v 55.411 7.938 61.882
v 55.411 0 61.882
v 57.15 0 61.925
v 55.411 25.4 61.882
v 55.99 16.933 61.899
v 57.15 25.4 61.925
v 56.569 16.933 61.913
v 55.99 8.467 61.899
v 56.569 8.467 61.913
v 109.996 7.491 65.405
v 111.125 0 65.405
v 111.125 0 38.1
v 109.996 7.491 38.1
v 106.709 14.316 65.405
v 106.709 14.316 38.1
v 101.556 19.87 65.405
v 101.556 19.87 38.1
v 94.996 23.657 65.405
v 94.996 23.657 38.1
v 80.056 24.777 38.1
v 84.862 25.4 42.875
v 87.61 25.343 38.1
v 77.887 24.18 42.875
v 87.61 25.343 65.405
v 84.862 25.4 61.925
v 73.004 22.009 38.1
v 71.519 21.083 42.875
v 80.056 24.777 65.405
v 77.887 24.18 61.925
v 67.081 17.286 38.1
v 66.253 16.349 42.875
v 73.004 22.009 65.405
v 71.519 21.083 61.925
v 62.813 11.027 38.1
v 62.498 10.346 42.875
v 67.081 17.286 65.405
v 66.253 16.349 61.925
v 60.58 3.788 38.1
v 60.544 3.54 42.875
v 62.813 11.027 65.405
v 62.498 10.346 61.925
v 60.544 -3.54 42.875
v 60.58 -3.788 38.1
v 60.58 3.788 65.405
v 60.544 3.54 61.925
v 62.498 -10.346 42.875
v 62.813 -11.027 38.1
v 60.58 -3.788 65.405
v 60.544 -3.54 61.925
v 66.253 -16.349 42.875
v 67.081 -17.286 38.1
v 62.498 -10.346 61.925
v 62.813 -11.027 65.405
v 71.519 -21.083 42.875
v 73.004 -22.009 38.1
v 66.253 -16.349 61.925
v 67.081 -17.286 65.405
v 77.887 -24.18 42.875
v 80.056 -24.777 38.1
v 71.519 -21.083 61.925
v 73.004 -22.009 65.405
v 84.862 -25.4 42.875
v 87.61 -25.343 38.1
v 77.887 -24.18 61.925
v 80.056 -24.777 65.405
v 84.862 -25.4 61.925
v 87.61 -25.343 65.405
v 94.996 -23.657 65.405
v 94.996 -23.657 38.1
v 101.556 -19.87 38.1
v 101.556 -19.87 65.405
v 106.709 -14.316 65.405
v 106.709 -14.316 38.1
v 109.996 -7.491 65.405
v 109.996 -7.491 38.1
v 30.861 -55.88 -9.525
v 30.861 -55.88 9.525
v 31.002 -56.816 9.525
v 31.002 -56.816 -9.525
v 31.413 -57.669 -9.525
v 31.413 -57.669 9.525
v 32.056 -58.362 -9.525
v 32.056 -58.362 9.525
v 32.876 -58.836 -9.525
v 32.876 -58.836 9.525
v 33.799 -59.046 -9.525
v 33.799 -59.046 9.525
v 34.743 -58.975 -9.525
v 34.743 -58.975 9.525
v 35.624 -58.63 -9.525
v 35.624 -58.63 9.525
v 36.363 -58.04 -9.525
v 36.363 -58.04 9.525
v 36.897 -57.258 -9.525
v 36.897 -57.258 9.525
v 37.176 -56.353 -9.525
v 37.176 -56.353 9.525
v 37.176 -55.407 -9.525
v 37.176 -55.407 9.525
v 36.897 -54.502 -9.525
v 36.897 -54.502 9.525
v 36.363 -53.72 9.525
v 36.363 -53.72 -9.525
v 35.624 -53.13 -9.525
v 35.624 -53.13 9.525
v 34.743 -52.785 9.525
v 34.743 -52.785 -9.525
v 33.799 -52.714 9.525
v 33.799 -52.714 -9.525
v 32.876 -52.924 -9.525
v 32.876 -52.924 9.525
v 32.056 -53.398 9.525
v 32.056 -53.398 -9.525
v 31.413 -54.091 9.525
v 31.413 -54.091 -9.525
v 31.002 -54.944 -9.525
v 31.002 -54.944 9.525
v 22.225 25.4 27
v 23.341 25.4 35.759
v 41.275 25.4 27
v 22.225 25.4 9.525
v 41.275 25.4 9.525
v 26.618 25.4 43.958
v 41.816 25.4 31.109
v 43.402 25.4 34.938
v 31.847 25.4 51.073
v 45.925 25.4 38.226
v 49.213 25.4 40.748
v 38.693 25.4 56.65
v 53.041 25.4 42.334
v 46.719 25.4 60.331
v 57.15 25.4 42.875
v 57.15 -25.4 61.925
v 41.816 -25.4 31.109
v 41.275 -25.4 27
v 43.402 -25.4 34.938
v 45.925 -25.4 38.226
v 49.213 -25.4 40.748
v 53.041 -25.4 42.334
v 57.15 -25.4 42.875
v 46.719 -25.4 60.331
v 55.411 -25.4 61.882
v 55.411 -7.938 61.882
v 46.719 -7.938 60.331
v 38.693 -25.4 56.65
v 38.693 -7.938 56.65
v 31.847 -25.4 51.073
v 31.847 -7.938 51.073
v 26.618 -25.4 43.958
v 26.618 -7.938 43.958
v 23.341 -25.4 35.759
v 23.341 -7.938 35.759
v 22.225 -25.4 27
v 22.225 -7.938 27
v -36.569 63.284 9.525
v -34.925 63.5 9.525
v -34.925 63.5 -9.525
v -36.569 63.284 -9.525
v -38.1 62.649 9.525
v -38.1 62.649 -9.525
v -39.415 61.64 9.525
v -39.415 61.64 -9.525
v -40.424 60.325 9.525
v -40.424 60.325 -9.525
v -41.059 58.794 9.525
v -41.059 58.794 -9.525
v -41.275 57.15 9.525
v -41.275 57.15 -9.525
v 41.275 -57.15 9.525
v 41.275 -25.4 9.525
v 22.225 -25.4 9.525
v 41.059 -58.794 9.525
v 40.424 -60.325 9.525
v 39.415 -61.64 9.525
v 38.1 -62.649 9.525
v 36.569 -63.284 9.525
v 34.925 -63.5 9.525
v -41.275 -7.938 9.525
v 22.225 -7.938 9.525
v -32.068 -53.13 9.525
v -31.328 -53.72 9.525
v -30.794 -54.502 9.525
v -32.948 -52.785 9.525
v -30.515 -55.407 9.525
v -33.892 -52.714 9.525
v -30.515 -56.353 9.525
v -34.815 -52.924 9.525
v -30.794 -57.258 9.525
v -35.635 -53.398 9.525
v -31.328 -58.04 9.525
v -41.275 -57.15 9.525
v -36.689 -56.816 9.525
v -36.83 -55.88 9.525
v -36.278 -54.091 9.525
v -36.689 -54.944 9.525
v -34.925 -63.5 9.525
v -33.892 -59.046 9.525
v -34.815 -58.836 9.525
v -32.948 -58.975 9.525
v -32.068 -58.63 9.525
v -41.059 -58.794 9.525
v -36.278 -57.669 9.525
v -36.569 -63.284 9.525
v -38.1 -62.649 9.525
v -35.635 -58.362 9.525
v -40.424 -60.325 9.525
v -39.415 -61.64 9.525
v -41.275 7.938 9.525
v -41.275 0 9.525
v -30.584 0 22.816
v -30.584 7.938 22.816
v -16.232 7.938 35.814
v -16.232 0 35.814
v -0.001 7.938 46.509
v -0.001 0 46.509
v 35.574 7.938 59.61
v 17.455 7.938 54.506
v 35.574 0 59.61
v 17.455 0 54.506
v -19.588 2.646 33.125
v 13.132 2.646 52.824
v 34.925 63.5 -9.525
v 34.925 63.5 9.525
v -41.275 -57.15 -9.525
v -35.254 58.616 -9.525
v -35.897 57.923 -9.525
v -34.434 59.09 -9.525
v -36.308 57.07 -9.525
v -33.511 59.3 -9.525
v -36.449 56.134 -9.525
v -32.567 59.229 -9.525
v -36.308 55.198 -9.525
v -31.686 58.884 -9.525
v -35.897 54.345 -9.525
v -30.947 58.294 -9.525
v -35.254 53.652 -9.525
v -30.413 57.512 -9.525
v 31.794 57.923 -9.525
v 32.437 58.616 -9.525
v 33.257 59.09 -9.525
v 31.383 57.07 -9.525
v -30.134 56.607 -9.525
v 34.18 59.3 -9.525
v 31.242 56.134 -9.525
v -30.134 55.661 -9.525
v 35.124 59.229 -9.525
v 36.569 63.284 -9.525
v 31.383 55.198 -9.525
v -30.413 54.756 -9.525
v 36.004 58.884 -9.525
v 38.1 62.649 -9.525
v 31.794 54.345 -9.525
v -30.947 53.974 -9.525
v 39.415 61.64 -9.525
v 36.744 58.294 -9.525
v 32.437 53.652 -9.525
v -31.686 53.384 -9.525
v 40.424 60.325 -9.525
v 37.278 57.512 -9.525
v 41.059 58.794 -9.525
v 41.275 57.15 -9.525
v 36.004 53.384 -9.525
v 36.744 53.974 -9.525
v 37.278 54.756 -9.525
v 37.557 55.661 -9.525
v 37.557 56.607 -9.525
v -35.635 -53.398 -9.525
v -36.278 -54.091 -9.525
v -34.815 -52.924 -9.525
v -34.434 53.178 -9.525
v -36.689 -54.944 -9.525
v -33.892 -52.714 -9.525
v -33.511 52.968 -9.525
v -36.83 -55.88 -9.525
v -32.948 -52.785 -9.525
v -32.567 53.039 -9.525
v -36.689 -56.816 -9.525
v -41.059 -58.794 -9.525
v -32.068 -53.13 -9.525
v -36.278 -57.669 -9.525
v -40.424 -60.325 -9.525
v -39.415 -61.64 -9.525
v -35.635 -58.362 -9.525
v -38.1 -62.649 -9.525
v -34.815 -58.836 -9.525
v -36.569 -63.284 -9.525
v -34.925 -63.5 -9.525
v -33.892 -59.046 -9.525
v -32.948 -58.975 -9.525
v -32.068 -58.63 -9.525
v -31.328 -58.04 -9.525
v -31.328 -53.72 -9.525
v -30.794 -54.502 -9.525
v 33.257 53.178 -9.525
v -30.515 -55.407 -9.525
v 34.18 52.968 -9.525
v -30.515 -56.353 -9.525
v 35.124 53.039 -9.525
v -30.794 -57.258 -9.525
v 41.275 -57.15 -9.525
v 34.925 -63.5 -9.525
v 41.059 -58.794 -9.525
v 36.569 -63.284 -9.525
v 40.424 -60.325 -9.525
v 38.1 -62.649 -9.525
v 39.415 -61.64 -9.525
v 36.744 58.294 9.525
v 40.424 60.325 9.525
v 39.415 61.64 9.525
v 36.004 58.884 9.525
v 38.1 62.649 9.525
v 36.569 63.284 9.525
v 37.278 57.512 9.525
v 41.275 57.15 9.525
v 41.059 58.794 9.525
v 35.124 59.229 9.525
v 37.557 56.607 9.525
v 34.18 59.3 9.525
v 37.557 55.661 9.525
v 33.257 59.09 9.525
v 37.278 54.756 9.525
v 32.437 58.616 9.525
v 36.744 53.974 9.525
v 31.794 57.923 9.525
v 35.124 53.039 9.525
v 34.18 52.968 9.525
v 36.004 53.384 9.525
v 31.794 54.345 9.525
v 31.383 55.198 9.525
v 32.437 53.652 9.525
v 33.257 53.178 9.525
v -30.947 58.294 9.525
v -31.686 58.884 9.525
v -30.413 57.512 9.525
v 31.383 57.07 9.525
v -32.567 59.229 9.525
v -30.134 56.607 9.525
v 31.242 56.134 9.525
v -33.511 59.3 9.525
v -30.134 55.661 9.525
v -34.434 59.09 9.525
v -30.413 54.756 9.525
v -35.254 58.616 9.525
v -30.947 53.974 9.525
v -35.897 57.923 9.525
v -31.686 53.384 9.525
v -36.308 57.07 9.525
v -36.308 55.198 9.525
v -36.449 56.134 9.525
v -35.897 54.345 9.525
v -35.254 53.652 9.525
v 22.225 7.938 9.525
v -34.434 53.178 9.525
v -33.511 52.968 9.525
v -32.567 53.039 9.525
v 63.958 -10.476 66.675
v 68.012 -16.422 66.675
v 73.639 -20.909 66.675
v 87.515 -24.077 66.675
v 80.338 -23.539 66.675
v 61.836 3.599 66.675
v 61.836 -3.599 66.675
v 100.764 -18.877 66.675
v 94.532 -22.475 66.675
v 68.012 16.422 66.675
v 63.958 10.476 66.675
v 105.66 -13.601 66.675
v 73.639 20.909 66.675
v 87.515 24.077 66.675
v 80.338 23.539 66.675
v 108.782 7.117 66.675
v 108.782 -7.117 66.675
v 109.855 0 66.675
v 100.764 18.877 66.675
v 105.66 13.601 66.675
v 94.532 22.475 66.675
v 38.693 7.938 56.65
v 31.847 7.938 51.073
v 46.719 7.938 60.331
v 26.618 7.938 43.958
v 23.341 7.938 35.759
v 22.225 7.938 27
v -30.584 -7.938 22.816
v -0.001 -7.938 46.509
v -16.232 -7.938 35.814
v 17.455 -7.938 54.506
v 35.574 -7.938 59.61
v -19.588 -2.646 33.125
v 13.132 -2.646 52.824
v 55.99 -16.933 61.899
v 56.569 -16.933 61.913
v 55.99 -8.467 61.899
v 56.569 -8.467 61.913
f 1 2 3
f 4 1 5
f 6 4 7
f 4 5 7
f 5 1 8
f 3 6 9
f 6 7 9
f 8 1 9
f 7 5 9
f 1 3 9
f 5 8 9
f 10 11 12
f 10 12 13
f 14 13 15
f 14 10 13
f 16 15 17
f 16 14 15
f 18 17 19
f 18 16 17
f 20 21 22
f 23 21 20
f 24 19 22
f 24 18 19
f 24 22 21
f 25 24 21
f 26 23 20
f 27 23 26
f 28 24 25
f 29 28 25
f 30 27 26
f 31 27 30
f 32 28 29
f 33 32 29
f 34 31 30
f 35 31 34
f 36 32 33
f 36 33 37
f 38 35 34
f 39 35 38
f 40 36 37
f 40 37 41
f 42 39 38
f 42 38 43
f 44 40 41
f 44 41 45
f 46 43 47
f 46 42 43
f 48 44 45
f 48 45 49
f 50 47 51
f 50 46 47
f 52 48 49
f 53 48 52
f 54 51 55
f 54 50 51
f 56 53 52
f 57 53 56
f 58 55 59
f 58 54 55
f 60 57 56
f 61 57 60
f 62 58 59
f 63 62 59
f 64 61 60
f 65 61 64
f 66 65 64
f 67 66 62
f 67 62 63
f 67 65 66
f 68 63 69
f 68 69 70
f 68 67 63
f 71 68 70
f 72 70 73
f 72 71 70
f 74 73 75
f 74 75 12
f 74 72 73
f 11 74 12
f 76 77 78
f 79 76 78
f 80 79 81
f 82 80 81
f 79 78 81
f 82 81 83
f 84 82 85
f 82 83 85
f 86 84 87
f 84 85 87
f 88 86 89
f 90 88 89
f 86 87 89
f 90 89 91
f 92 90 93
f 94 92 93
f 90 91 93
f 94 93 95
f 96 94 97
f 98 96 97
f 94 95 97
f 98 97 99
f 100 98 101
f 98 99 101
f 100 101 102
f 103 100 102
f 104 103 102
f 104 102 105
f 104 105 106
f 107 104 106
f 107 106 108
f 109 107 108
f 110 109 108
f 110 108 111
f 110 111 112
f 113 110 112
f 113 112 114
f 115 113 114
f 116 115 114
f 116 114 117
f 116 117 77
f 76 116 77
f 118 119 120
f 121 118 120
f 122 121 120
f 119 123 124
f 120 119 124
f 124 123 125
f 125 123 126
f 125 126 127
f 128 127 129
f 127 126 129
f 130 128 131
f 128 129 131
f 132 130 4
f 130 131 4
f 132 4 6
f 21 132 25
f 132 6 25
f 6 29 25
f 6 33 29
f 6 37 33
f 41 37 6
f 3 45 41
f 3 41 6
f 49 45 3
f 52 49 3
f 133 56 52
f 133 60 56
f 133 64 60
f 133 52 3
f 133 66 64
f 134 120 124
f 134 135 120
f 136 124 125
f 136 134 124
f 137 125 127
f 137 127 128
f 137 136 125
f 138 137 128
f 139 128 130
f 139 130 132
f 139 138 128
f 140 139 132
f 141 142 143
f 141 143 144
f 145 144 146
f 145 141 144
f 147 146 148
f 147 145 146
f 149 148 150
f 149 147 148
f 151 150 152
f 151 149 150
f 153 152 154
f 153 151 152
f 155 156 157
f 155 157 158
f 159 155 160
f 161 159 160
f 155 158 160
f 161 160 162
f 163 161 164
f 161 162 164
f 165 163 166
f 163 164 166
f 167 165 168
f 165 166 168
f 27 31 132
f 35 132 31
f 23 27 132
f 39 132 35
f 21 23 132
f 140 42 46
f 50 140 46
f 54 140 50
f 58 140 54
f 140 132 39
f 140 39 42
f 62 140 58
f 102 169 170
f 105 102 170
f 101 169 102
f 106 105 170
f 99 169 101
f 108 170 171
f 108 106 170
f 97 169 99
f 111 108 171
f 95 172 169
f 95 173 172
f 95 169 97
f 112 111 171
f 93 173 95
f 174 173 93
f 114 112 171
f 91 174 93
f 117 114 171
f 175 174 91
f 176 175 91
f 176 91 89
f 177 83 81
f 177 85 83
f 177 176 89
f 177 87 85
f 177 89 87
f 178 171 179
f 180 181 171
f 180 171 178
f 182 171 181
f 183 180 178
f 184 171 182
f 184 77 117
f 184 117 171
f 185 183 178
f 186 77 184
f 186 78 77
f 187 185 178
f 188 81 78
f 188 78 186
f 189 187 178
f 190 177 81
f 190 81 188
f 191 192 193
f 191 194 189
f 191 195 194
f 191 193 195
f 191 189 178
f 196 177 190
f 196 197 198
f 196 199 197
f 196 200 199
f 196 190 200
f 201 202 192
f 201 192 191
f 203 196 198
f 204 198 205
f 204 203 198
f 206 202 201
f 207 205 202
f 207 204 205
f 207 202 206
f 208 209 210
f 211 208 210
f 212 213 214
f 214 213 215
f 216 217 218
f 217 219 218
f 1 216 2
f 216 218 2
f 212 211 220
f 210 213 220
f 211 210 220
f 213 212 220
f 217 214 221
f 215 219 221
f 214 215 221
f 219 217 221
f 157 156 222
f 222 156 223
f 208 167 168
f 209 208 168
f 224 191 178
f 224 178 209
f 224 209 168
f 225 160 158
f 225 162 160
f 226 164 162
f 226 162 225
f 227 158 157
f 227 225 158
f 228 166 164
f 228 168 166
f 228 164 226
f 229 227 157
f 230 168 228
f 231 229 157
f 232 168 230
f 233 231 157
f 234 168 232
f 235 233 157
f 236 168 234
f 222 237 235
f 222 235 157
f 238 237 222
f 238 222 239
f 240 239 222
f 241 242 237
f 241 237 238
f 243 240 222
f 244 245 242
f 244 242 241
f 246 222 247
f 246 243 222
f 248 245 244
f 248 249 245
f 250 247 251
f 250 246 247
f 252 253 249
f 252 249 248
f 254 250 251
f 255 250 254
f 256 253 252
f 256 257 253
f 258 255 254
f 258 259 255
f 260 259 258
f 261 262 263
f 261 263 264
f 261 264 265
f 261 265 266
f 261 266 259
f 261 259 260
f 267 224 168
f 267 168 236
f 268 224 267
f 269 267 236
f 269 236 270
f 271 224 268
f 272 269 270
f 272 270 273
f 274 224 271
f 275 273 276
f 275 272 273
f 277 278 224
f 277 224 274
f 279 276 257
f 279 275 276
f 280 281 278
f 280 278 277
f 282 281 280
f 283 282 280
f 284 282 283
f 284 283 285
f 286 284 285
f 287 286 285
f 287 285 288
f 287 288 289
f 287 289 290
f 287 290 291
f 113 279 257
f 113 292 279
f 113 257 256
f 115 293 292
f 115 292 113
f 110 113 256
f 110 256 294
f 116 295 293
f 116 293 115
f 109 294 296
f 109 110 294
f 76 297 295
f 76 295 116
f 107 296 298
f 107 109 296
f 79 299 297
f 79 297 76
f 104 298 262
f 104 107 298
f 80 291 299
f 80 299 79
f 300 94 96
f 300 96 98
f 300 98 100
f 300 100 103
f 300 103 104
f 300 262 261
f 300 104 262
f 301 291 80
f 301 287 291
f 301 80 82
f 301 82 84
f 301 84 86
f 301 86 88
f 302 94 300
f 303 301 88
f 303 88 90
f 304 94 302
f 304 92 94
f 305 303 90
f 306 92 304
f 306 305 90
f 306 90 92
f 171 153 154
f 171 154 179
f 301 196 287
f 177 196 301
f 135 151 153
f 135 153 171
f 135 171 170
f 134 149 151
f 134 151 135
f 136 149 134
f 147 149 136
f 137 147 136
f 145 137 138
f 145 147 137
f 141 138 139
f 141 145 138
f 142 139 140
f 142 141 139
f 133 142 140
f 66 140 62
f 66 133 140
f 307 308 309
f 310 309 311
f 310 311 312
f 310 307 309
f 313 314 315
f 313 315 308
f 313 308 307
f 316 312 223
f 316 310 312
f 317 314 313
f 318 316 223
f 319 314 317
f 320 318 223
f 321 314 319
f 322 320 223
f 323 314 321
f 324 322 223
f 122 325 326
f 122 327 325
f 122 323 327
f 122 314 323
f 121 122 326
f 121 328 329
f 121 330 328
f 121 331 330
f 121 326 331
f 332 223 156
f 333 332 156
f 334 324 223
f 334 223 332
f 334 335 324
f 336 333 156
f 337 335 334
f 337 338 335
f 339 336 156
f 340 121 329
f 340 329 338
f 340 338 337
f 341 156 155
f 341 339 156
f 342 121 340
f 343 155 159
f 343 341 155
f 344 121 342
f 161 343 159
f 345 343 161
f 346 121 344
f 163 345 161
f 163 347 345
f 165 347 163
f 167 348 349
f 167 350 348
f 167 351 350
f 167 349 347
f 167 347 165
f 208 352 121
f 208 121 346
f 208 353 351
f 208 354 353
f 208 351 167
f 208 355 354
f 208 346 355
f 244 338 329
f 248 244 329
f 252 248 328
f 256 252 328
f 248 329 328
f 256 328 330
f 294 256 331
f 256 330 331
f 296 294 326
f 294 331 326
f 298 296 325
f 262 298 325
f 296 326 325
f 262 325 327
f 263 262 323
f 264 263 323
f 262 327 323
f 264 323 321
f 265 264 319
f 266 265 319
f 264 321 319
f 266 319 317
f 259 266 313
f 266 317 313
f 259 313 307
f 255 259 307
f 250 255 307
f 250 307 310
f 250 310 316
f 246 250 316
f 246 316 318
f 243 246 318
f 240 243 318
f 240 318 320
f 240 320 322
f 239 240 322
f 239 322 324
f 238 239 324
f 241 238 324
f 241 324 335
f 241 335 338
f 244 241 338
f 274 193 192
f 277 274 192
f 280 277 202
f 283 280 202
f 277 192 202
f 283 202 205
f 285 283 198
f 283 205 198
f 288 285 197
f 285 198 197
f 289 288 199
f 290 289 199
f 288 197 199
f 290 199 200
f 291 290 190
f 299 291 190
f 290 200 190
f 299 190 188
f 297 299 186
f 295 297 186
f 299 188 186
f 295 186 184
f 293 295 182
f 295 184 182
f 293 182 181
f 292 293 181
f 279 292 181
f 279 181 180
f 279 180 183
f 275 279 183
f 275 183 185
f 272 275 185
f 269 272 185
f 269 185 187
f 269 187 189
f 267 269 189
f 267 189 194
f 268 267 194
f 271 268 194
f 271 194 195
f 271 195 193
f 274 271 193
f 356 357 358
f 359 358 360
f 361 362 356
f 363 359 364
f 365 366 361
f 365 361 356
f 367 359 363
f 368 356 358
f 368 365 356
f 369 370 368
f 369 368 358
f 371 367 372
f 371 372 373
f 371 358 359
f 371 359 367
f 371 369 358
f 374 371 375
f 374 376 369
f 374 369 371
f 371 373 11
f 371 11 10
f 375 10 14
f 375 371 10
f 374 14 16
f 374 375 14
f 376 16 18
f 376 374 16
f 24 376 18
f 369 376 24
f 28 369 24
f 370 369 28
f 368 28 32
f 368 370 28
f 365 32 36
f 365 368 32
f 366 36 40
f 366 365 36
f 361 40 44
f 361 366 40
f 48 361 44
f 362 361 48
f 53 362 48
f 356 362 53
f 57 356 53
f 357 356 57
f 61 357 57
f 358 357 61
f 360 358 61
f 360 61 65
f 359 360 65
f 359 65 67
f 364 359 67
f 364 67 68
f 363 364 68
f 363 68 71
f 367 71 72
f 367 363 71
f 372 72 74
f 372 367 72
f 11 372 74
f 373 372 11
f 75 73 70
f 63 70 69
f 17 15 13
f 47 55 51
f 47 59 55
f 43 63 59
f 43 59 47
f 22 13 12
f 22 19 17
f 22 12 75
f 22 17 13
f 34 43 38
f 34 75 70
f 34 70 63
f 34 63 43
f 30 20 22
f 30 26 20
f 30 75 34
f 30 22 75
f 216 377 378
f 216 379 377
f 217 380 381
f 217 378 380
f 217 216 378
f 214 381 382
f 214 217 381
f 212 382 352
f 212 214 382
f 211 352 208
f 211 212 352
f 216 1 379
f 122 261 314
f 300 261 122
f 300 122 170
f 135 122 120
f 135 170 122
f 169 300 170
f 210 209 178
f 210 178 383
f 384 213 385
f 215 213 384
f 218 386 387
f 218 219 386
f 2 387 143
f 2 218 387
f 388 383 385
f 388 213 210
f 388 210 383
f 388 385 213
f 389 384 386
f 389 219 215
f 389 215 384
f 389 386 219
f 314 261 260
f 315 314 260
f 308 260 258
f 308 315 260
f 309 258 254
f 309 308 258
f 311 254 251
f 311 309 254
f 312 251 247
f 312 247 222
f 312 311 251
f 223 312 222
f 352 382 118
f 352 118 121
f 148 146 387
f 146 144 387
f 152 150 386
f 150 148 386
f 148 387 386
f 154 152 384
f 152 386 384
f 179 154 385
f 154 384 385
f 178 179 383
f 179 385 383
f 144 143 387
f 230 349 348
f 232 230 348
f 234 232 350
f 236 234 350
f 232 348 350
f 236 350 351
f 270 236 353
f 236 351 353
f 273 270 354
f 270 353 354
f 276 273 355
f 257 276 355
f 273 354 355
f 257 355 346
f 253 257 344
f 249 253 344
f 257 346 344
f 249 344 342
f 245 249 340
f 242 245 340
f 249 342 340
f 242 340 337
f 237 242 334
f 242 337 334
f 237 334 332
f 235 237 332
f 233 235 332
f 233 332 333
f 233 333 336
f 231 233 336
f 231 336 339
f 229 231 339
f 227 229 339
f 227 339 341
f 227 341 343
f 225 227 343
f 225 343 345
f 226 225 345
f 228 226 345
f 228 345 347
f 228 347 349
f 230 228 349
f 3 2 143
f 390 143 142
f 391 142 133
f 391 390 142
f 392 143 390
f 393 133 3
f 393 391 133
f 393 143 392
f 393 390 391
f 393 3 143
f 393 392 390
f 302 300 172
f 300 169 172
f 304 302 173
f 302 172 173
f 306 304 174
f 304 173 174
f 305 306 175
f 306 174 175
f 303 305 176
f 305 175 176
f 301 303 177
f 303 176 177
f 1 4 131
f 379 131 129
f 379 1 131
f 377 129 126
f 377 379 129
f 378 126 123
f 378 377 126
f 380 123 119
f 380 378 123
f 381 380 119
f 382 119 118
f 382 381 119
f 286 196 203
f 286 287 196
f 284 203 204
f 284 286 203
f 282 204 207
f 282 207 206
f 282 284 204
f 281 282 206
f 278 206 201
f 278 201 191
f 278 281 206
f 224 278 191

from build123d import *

# Parameters (mm, degrees)
F1_DEPTH = 63.5
F0_W     = 25.3858086348
F0_H     = 19.05
F2_DEPTH = 25.4
F3_DEPTH = 7.9375
F5_R     = 6.35
F7_D     = 6.35
F8_SIZE2 = 1.27
F8_SIZE  = 1.27


with BuildPart() as f1:
    # F0 (on Front) → F1 (new body, symmetric)
    with BuildSketch(Plane.XZ):
        Polygon((-41.275, 9.525), (-41.275, -9.525), (41.275, -9.525), (41.275, 9.525), (22.225, 9.525), align=None)
    extrude(amount=F1_DEPTH, both=True)

    # F0 (on Front) → F2 (join, symmetric)
    with BuildSketch(Plane.XZ):
        with Locations((73.0179043174, 52.4002)):
            Rectangle(F0_W, F0_H)
        with BuildLine():
            Line((22.225, 9.525), (41.275, 9.525))
            Line((41.275, 9.525), (41.275, 27.0002))
            ThreePointArc((41.275, 27.0002), (45.9246798487, 38.2255201513), (57.15, 42.8752))
            Line((57.15, 42.8752), (60.325, 42.8752))
            Line((60.325, 42.8752), (60.325, 61.9252))
            Line((60.325, 61.9252), (57.15, 61.9252))
            add(Edge.make_bspline(
                [(55.4113425633, 61.8818957059), (55.9890331624, 61.9003631029), (56.5685898657, 61.9148171773), (57.15, 61.9252)],
                knots=[110.1382061471, 110.1382061471, 110.1382061471, 110.1382061471, 111.5045361635, 111.5045361635, 111.5045361635, 111.5045361635], degree=3))
            ThreePointArc((55.4113425633, 61.8818957059), (31.8470531758, 51.073349088), (22.225, 27.0002))
            Line((22.225, 27.0002), (22.225, 9.525))
        make_face()
    extrude(amount=F2_DEPTH, both=True)

    # F0 (on Front) → F3 (join, symmetric)
    with BuildSketch(Plane.XZ):
        with BuildLine():
            add(Edge.make_bspline(
                [(-41.275, 9.525), (-25.5970072353, 32.826953112), (8.8444037337, 60.3932612228), (55.4113425633, 61.8818957059)],
                knots=[0, 0, 0, 0, 110.1382061471, 110.1382061471, 110.1382061471, 110.1382061471], degree=3))
            Line((-41.275, 9.525), (22.225, 9.525))
            Line((22.225, 9.525), (22.225, 27.0002))
            ThreePointArc((22.225, 27.0002), (31.8470531758, 51.073349088), (55.4113425633, 61.8818957059))
        make_face()
    extrude(amount=F3_DEPTH, both=True)

    # F0 (on Front) → F4 (revolve)
    with BuildSketch(Plane.XZ):
        Polygon((85.7108086348, 66.675), (85.7108086348, 61.9252), (85.7108086348, 42.8752), (85.7108086348, 38.1), (111.125, 38.1), (111.125, 66.675), align=None)
    revolve(axis=Axis((85.7108086348, 0, 52.3875), (0, 0, 1)))

    # F5
    f5_edges = [f1.edges().sort_by_distance(p)[0] for p in [
        (-41.275, -63.5, 0),
        (41.275, -63.5, 0),
        (41.275, 63.5, 0),
        (-41.275, 63.5, 0),
    ]]
    fillet(f5_edges, radius=F5_R)

    # F7 (through all)
    with Locations(Plane(origin=(0, 0, -9.525), x_dir=(1, 0, 0), z_dir=(0, 0, -1))):
        with Locations((-33.655, 55.88), (34.036, 55.88), (34.417, -56.134), (-33.274, -56.134)):
            Hole(F7_D / 2)

    # F8
    f8_edges = [f1.edges().sort_by_distance(p)[0] for p in [
        (60.296617, 0, 66.675),
    ]]
    chamfer(f8_edges, length=F8_SIZE, length2=F8_SIZE2)


solid = f1.part
